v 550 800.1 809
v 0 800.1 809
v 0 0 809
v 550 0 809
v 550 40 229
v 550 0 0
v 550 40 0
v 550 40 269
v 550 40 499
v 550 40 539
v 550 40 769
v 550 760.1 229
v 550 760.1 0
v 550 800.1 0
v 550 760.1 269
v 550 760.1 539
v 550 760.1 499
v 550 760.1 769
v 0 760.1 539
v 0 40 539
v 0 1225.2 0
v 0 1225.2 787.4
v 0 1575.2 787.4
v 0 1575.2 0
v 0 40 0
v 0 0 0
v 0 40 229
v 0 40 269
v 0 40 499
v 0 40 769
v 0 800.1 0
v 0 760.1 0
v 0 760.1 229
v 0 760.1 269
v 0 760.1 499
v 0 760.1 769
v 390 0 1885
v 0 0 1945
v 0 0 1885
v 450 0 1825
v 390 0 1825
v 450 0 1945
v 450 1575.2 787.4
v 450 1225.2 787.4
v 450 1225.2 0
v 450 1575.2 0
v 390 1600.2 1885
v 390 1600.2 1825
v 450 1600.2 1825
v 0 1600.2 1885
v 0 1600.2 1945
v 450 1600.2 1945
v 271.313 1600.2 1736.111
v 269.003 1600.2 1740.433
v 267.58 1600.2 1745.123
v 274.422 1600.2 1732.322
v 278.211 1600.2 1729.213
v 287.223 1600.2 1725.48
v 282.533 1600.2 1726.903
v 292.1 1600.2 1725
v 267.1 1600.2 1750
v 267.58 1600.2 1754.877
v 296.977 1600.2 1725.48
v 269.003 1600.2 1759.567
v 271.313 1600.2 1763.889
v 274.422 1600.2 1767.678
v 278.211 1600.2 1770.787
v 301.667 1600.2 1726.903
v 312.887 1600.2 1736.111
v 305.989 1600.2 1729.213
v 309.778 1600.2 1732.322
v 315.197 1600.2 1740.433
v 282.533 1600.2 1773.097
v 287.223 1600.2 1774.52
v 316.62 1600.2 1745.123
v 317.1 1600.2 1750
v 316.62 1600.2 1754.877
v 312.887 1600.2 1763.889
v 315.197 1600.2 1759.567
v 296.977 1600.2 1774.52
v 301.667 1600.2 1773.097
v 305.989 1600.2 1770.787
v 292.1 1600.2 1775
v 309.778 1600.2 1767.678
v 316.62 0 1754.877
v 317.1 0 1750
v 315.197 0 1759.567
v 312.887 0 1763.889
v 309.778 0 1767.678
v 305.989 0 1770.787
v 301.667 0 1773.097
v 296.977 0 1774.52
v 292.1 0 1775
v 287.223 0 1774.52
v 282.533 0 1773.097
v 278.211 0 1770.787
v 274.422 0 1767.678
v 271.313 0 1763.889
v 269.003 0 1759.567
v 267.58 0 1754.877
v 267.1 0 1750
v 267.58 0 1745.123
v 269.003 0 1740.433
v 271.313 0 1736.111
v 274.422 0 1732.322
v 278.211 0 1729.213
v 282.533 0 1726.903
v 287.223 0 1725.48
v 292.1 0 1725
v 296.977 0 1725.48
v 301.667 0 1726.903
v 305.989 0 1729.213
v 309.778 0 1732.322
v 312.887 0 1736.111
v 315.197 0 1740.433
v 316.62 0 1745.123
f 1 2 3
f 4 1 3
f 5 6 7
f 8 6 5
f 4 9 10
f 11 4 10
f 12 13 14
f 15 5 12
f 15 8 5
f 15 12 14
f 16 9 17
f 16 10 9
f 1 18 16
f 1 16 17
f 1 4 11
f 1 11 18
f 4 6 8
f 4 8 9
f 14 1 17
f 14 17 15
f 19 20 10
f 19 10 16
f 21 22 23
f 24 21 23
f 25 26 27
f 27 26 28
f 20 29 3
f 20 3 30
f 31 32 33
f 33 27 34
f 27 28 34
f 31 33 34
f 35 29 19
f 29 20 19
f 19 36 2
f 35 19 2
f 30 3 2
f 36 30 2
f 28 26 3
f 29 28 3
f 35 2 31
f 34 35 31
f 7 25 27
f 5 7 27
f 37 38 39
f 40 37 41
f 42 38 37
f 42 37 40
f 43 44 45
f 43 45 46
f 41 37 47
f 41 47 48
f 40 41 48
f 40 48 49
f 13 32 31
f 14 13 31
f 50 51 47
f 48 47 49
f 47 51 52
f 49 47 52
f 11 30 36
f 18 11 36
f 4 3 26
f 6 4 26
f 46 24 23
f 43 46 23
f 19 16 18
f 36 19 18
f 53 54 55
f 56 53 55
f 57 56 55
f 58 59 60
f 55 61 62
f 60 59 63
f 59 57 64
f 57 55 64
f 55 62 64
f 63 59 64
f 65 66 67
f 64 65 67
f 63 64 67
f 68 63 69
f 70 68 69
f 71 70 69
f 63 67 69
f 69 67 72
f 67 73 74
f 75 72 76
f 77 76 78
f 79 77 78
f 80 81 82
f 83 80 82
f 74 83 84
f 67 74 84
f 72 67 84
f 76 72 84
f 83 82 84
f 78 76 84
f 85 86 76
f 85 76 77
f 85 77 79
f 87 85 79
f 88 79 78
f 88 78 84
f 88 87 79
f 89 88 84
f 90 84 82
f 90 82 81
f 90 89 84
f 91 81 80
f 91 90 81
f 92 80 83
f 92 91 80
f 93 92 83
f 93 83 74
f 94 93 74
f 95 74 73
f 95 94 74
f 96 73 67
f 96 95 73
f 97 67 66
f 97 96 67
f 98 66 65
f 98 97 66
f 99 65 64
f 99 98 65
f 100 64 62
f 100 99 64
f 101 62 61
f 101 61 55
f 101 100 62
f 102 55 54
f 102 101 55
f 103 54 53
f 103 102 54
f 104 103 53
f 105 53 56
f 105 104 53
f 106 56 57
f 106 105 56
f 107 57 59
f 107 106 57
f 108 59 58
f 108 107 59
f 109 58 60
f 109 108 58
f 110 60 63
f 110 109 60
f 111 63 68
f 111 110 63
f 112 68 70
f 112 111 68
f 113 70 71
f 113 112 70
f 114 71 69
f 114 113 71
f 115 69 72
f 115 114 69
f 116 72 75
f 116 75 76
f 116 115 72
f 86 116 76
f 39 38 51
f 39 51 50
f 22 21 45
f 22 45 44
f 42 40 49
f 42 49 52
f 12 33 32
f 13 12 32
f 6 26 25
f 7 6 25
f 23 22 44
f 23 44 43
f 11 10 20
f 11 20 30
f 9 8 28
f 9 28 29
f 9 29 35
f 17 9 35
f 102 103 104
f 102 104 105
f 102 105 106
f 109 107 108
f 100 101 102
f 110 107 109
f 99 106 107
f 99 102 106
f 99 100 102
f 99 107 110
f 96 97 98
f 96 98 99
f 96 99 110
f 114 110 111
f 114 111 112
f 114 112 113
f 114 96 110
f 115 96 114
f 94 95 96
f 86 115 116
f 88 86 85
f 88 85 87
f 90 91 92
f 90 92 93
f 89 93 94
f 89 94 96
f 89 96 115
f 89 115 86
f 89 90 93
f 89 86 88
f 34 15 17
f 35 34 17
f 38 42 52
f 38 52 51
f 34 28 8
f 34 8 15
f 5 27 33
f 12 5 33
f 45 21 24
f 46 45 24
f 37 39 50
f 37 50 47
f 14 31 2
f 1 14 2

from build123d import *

# Parameters (mm, degrees)
F6_R      = 25
F7_DEPTH  = 1600.2
F8_W      = 720.1
F8_H      = 230
F9_DEPTH  = 550
F10_DEPTH = 25
F11_W     = 350
F11_H     = 787.4
F12_DEPTH = 450


with BuildPart() as f7:
    # F6 (on Front) → F7 (new body, through all)
    with BuildSketch(Plane.XZ):
        with Locations((292.1, 1750)):
            Circle(F6_R)
        Polygon((450, 1945), (0, 1945), (0, 1885), (390, 1885), (390, 1825), (450, 1825), align=None)
    extrude(amount=-F7_DEPTH)


with BuildPart() as f9:
    # F8 (on Right) → F9 (new body)
    with BuildSketch(Plane.YZ):
        Polygon((800.1, 809), (0, 809), (0, 0), (40, 0), (40, 229), (760.1, 229), (760.1, 0), (800.1, 0), align=None)
        with Locations((400.05, 384)):
            Rectangle(F8_W, F8_H, mode=Mode.SUBTRACT)
        with Locations((400.05, 654)):
            Rectangle(F8_W, F8_H, mode=Mode.SUBTRACT)
    extrude(amount=F9_DEPTH)

    # F8 (on Right) → F10 (join)
    with BuildSketch(Plane.YZ):
        Polygon((800.1, 809), (0, 809), (0, 0), (40, 0), (40, 229), (760.1, 229), (760.1, 0), (800.1, 0), align=None)
        with Locations((400.05, 384)):
            Rectangle(F8_W, F8_H, mode=Mode.SUBTRACT)
        with Locations((400.05, 654)):
            Rectangle(F8_W, F8_H, mode=Mode.SUBTRACT)
    extrude(amount=F10_DEPTH)


with BuildPart() as f12:
    # F11 (on Right) → F12 (new body)
    with BuildSketch(Plane.YZ):
        with Locations((1400.2, 393.7)):
            Rectangle(F11_W, F11_H)
    extrude(amount=F12_DEPTH)


solid = Compound([f7.part, f9.part, f12.part])
